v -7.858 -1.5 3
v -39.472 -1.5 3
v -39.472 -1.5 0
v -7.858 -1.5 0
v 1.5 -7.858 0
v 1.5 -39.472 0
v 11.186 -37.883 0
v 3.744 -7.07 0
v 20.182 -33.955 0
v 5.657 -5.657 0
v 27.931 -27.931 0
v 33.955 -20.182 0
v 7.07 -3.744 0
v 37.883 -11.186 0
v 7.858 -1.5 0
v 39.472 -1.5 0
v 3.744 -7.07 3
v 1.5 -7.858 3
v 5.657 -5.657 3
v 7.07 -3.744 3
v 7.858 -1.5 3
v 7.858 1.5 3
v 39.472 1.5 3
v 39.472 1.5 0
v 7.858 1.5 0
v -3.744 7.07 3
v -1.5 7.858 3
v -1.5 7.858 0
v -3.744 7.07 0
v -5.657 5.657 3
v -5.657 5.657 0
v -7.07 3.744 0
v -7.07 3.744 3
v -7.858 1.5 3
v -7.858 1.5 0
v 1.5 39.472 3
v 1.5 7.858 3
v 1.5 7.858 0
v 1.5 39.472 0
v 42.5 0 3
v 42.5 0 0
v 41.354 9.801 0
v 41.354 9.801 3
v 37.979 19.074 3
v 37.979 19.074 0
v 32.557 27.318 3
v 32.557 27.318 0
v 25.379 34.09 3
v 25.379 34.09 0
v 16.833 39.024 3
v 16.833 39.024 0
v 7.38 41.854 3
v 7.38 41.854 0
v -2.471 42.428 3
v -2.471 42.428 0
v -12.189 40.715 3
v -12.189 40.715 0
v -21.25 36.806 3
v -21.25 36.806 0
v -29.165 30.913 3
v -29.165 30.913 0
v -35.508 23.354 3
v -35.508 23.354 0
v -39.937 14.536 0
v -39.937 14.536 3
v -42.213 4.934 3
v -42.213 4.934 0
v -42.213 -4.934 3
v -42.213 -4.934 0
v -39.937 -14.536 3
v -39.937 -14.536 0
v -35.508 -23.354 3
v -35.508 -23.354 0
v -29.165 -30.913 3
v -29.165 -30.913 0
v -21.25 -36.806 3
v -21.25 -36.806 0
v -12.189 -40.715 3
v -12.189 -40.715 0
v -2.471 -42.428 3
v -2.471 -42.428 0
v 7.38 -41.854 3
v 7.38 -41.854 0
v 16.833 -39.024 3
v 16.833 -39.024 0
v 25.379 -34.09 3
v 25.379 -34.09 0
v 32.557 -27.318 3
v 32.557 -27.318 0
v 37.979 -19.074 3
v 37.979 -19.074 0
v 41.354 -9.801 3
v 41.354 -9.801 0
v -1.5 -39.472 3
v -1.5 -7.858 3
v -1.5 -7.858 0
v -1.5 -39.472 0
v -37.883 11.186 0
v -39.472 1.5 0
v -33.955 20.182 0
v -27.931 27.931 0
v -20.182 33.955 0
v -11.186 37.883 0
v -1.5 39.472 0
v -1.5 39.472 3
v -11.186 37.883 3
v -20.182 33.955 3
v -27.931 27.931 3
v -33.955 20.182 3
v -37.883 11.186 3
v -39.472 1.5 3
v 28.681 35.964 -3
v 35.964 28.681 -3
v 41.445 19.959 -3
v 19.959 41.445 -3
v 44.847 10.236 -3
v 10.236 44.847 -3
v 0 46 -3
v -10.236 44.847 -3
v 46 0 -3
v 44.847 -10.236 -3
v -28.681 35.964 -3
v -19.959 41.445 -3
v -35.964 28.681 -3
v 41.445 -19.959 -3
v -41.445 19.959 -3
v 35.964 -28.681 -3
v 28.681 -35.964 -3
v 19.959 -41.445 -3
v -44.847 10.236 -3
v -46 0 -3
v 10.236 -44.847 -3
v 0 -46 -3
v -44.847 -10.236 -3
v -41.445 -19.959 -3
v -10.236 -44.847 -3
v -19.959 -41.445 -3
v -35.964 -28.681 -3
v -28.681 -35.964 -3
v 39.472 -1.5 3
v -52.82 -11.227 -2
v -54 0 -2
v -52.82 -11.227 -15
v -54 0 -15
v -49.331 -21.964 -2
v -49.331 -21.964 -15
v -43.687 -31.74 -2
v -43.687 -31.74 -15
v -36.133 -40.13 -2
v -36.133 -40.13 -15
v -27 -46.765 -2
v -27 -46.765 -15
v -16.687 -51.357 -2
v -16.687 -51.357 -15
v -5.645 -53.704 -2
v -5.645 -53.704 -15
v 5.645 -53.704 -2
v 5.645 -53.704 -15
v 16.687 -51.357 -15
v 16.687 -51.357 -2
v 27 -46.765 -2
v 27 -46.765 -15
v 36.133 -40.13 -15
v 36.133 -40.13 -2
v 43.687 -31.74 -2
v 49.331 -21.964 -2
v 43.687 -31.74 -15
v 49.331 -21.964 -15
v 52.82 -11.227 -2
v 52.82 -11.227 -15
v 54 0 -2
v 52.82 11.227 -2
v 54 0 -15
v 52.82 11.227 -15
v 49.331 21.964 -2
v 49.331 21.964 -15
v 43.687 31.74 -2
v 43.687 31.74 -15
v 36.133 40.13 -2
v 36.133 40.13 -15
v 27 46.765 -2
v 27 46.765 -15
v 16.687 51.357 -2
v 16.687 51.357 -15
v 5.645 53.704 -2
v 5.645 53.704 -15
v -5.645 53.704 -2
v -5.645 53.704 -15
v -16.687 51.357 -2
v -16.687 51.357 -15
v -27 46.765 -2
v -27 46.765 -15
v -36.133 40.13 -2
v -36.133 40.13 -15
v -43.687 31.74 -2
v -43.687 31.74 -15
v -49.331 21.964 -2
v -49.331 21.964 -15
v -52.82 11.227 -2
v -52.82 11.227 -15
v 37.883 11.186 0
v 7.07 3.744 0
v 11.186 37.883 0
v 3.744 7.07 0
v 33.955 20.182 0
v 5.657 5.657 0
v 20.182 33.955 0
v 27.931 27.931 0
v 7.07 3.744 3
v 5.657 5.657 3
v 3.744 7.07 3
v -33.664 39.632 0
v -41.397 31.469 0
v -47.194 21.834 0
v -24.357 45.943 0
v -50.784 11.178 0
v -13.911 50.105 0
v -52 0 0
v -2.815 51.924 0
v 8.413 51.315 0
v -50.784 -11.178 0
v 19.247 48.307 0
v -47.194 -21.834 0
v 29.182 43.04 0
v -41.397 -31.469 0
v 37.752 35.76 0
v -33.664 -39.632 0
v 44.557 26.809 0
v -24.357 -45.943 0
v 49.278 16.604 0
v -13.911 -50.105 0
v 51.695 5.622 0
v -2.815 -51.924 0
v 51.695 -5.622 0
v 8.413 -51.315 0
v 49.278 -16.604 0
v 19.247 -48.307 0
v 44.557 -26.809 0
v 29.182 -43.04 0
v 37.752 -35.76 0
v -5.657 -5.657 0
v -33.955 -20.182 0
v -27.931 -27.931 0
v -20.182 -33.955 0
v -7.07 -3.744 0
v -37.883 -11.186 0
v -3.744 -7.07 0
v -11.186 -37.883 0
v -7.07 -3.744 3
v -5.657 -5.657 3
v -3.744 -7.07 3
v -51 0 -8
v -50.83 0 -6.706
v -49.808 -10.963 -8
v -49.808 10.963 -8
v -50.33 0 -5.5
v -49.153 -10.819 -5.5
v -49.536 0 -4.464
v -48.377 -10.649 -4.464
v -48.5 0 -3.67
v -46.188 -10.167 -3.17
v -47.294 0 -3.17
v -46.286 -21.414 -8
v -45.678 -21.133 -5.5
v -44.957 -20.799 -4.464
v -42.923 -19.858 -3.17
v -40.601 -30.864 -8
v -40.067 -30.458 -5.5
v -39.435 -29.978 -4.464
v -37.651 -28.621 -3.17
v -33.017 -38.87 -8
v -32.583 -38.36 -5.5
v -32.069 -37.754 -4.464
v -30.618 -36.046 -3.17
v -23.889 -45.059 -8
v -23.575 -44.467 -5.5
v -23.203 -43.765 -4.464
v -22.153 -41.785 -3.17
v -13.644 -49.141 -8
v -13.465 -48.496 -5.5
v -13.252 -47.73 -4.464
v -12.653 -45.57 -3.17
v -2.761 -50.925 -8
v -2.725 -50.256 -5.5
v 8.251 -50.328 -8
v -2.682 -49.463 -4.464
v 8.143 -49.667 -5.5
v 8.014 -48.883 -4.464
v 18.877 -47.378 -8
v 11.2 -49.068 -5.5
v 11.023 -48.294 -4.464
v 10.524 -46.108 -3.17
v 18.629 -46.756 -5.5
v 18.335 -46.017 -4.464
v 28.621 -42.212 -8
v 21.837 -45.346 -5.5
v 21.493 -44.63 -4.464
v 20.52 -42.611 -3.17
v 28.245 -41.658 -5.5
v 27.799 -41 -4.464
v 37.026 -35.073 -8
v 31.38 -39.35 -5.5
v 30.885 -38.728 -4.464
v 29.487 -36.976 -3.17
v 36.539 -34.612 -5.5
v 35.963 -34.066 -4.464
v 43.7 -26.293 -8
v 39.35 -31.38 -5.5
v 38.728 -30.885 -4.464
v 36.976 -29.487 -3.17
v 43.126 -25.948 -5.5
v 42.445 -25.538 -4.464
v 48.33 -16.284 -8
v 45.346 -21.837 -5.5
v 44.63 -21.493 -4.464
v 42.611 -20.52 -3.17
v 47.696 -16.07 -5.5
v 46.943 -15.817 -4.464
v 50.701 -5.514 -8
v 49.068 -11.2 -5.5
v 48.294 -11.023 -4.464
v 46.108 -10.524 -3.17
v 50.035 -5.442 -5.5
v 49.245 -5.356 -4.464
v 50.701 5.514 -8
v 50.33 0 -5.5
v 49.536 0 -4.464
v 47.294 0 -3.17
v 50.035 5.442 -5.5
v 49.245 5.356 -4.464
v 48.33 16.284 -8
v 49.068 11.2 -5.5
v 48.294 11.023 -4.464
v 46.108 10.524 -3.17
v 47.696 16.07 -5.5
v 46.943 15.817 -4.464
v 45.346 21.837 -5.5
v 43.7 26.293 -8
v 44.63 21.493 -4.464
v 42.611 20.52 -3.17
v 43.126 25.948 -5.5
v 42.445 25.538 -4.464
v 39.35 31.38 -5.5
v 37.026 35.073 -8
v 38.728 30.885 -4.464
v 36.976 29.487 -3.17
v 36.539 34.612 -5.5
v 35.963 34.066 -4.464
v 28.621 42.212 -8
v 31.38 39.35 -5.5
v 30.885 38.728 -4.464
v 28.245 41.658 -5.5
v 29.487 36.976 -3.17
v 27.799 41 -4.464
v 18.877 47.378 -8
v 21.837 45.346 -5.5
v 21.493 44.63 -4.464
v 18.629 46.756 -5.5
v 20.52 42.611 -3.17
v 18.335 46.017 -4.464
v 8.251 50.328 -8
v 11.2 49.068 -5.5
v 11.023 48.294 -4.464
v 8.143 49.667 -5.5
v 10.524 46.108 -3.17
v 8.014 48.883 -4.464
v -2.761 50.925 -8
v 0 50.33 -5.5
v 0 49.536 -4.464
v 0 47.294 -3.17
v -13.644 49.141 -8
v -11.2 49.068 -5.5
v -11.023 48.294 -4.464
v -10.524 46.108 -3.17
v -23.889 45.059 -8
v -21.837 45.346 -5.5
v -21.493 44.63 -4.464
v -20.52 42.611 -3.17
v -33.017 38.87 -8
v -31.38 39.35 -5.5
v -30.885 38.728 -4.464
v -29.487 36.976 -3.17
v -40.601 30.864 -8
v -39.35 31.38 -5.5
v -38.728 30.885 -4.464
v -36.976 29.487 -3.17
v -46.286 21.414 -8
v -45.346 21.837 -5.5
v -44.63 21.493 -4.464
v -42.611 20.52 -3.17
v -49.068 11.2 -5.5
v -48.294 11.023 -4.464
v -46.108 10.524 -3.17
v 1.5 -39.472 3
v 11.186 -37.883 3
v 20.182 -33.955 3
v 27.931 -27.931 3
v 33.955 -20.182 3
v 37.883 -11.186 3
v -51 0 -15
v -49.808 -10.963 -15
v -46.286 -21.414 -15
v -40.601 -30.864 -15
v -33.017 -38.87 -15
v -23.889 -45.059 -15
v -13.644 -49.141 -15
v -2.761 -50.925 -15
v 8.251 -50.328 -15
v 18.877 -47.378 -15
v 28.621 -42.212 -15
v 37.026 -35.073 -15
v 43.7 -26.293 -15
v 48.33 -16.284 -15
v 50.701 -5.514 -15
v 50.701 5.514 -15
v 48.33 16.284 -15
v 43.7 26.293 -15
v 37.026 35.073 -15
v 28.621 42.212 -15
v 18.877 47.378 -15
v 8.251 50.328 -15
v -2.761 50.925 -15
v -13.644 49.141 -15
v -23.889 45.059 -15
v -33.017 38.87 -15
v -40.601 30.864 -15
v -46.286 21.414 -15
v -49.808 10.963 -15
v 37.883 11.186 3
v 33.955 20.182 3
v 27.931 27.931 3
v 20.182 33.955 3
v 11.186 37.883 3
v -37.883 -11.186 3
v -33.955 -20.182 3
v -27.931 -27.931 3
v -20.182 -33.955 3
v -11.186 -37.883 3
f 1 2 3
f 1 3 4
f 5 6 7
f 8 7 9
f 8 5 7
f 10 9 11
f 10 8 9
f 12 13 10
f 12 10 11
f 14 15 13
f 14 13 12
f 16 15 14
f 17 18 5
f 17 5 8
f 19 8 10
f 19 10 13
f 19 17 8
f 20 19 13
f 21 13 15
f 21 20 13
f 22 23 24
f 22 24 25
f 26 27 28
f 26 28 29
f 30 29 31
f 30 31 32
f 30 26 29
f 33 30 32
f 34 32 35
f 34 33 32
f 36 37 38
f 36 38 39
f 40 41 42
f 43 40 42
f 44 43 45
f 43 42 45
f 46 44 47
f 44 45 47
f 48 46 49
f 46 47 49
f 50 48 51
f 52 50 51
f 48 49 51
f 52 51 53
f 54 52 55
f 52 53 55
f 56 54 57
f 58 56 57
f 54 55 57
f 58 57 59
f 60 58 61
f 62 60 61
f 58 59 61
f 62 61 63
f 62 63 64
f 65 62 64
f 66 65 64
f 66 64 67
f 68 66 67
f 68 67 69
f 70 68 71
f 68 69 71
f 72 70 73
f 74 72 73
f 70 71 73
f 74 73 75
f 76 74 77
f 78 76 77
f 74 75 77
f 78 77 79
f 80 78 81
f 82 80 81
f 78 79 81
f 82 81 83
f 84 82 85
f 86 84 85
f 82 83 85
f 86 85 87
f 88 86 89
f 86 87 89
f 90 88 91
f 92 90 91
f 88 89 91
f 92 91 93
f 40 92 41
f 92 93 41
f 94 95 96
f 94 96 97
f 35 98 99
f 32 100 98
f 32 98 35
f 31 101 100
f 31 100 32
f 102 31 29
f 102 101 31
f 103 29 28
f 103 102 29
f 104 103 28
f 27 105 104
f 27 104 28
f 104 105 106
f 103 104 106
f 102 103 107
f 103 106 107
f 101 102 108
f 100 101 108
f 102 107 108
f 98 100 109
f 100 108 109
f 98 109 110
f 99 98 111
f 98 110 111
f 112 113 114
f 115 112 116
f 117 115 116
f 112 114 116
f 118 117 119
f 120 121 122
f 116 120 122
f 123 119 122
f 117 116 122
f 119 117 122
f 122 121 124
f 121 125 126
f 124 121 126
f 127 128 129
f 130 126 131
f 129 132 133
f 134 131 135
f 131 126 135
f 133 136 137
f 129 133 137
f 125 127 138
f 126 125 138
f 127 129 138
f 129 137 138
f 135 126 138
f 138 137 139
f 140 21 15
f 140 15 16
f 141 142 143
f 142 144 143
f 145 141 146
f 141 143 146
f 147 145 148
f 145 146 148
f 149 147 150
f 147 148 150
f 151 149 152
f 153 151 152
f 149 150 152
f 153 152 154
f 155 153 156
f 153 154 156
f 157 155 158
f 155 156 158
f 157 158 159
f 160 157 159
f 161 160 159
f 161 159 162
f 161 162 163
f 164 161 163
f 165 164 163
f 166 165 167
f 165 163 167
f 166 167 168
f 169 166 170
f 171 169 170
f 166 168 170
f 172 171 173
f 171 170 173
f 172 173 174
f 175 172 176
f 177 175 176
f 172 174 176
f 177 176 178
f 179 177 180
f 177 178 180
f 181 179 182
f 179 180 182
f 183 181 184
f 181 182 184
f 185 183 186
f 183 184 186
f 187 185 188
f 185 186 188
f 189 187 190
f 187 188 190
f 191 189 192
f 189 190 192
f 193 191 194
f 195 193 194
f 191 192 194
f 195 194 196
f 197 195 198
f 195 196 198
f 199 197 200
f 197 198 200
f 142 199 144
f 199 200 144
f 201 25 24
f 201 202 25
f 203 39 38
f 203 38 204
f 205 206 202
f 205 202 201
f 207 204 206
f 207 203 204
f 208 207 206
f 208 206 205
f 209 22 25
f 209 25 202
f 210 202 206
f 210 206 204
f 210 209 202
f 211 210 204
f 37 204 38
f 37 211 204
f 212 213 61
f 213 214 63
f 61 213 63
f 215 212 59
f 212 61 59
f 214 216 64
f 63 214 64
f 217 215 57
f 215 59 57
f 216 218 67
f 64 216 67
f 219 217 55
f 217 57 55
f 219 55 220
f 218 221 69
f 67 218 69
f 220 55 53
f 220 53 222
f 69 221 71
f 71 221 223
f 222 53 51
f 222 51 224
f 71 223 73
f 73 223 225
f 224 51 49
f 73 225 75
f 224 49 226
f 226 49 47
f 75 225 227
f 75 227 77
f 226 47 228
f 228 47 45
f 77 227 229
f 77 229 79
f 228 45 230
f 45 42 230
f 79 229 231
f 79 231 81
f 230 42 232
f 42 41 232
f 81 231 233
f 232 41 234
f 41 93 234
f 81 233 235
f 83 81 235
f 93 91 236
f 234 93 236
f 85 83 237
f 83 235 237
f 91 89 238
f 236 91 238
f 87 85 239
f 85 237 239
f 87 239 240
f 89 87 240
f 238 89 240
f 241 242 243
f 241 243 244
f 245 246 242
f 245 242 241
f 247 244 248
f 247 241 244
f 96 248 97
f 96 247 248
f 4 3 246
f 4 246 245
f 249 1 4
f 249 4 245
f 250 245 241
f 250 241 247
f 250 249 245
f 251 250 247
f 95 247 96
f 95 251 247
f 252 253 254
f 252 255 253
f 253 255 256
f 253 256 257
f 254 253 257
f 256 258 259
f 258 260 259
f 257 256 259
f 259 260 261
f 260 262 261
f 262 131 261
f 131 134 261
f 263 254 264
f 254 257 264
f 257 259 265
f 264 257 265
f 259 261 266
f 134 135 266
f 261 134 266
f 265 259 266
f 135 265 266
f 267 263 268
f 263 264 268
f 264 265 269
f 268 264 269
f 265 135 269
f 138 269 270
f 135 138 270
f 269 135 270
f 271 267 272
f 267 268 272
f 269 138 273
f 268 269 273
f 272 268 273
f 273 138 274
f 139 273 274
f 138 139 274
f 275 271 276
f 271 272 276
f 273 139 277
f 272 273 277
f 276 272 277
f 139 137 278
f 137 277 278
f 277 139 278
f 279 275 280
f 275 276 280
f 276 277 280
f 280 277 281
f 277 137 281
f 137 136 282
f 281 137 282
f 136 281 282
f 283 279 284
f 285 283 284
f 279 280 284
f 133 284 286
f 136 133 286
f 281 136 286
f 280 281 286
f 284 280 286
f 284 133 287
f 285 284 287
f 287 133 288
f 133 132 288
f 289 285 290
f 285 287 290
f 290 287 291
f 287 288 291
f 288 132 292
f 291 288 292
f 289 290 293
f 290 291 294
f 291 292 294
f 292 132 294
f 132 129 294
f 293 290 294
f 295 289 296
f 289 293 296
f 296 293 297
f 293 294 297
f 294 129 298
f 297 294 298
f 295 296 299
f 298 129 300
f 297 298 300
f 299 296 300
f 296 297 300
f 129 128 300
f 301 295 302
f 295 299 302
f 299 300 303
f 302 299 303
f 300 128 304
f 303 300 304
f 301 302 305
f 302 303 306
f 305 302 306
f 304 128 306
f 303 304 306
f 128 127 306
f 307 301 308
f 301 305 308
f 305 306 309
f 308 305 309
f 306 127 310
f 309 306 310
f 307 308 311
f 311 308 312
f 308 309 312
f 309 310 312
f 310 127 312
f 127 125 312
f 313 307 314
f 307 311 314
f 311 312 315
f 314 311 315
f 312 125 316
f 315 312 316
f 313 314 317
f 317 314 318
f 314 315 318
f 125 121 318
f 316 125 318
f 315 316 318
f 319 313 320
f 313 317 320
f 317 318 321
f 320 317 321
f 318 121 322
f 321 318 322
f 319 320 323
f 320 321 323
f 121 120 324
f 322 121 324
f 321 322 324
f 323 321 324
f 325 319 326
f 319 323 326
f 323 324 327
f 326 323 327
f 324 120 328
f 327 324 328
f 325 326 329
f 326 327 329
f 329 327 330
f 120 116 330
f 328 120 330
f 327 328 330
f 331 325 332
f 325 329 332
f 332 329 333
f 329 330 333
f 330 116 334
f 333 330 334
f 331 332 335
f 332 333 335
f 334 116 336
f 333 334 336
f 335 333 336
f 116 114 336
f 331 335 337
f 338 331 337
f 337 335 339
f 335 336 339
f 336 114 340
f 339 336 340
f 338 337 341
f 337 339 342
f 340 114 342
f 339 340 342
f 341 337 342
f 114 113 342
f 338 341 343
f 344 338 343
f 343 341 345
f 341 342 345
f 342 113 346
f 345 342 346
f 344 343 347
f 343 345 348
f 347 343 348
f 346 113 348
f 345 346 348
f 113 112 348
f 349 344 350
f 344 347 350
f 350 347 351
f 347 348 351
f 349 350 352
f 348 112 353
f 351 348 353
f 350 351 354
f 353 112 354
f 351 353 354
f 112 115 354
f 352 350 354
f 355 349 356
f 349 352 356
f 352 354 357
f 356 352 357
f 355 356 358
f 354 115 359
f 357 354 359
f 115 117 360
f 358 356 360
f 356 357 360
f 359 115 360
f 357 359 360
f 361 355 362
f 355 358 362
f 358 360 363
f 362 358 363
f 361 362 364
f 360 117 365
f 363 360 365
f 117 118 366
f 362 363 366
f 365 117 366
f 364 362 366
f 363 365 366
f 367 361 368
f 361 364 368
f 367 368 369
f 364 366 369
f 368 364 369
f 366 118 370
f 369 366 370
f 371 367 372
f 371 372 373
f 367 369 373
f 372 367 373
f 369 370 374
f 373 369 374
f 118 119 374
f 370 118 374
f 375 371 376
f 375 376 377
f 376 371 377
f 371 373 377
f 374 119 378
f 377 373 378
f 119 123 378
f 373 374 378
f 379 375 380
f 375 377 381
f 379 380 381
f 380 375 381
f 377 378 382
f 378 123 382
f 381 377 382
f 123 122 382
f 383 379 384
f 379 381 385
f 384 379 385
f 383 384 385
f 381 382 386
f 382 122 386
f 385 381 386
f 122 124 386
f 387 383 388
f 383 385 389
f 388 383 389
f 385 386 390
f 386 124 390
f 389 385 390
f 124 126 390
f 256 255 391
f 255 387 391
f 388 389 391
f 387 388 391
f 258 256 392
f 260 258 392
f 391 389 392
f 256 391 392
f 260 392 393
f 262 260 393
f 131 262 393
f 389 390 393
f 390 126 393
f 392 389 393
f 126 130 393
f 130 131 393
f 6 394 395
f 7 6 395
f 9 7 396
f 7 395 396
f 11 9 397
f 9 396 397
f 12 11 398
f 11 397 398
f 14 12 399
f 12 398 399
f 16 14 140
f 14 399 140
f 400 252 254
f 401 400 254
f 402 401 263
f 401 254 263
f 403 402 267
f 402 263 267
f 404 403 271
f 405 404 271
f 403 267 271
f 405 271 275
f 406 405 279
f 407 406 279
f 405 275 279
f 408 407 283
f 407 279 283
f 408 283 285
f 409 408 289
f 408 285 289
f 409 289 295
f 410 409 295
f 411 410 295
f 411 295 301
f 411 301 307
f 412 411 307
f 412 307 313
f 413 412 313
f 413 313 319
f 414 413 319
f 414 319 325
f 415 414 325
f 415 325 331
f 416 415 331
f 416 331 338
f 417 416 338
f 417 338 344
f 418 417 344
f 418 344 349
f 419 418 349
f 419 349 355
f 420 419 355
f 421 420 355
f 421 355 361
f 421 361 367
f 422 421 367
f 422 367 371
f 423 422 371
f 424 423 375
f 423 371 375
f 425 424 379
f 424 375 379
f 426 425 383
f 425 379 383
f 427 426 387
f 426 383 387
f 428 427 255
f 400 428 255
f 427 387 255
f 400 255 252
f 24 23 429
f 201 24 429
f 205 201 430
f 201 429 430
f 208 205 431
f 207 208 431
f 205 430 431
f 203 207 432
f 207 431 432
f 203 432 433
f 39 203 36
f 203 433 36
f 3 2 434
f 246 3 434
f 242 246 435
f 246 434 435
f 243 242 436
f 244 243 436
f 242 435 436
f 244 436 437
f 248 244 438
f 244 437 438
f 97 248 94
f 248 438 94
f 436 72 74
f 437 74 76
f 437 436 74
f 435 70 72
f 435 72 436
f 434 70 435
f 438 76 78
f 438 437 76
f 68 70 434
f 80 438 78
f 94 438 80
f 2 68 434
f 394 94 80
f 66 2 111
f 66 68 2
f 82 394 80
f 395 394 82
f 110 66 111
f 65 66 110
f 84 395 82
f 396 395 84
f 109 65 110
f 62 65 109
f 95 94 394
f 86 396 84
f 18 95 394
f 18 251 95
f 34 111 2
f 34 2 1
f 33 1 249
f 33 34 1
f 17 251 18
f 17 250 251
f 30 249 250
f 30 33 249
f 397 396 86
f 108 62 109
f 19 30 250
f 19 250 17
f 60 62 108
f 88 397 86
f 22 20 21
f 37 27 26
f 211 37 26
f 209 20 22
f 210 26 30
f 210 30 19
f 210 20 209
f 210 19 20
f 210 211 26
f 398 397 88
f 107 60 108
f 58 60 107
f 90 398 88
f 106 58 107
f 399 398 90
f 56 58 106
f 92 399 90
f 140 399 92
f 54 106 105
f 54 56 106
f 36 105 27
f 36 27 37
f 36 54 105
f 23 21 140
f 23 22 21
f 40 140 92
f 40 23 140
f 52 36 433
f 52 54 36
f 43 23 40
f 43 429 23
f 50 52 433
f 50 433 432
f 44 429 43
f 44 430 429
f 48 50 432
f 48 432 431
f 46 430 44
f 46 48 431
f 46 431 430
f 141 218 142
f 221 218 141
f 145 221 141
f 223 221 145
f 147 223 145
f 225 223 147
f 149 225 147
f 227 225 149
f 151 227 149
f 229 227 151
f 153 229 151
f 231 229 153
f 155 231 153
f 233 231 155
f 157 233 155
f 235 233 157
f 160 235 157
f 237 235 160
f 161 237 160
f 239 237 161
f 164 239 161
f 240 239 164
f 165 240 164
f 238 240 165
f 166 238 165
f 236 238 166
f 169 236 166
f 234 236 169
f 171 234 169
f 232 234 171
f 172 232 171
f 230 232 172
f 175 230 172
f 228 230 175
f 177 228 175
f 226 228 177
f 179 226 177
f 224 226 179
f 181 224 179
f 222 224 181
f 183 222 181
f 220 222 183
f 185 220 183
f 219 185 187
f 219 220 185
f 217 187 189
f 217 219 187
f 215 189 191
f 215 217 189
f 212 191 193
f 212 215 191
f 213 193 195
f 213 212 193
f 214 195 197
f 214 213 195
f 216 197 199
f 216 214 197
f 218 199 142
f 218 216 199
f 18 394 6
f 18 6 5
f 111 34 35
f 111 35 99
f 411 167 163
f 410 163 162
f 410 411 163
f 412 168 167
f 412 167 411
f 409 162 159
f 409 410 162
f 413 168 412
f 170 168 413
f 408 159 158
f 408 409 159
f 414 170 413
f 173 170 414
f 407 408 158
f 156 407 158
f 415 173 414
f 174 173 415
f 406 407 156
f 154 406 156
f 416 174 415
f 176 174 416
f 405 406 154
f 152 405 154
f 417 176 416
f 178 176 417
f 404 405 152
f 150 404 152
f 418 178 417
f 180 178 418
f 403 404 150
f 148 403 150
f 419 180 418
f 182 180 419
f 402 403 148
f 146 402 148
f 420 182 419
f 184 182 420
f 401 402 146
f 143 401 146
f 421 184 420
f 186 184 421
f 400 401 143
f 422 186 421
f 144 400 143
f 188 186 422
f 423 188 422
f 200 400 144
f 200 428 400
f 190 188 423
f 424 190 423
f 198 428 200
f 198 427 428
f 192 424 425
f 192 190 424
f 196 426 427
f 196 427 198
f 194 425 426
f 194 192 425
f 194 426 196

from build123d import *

# Parameters (mm, degrees)
EXTRUDE_1_DEPTH                  = 10
FILLET_1_R                       = 2
PATTERN_CIRCULAR_2_COUNT         = 3
FILLET_1_OF_PATTERN_CIRCULAR_2_R = 2
CUT_EXTRUDE_START                = -15
SKETCH_3_R                       = 51
CUT_EXTRUDE_1_DEPTH              = 15
SKETCH_4_R                       = 62.618720145
SKETCH_4_R_2                     = 57
CUT_EXTRUDE_2_DEPTH              = 15
CHAMFER_1_SIZE                   = 2
FILLET_2_R                       = 5
SKETCH_5_R                       = 42.5
EXTRUDE_2_DEPTH                  = 3
SKETCH_7_R                       = 39.5
CUT_EXTRUDE_3_DEPTH              = 3
EXTRUDE_START                    = 3
SKETCH_8_W                       = 3
SKETCH_8_H                       = 3
EXTRUDE_4_DEPTH                  = 3
SKETCH_9_R                       = 73.179522897
CUT_EXTRUDE_4_DEPTH              = 130


with BuildPart() as part:
    # Эскиз1 → Повернуть1 (revolve)
    with BuildSketch(Plane(origin=(0, 0, 0), x_dir=(1, 0, 0), z_dir=(0, 1, 0))):
        Polygon((0, 0), (-54, 0), (-54, 145), (-51, 145), (-51, 3), (0, 3), align=None)
    revolve(axis=Axis((0, 0, -3), (0, 0, 1)))

    # Эскиз2 → Бобышка-Вытянуть1 (add)
    with BuildSketch(Plane(origin=(57, 0, 0), x_dir=(0, 0, -1), z_dir=(1, 0, 0))):
        Polygon((145, 14), (145, -14), (140, -14), (138.5, 11), (134, 11), (134, 14), align=None)
    extrude_1 = extrude(amount=-EXTRUDE_1_DEPTH)

    # Скругление1
    fillet_1_edges = [part.edges().sort_by_distance(p)[0] for p in [
        (54.576809621, -14, -140),
    ]]
    fillet(fillet_1_edges, radius=FILLET_1_R)

    # Круговой массив2: Бобышка-Вытянуть1 ×3 about axis
    pattern_circular_2_axis = Axis((0, 0, 0), (0, 0, 1))
    for i in range(1, PATTERN_CIRCULAR_2_COUNT):
        add(extrude_1.rotate(pattern_circular_2_axis, i * 360 / PATTERN_CIRCULAR_2_COUNT))

    # Скругление1 of Круговой массив2
    fillet_1_of_pattern_circular_2_edges = [part.edges().sort_by_distance(p)[0] for p in [
        (-15.164049157, 54.264903589, -140),
        (-39.412760463, -40.264903589, -140),
    ]]
    fillet(fillet_1_of_pattern_circular_2_edges, radius=FILLET_1_OF_PATTERN_CIRCULAR_2_R)

    # Эскиз3 → Вырез-Вытянуть1 (cut)
    with BuildSketch(Plane(origin=(0, 0, -145), x_dir=(-1, 0, 0), z_dir=(0, 0, -1)).offset(CUT_EXTRUDE_START)):
        Circle(SKETCH_3_R)
    extrude(amount=CUT_EXTRUDE_1_DEPTH, mode=Mode.SUBTRACT)

    # Эскиз4 → Вырез-Вытянуть2 (cut)
    with BuildSketch(Plane(origin=(0, 0, -145), x_dir=(-1, 0, 0), z_dir=(0, 0, -1))):
        Circle(SKETCH_4_R)
        Circle(SKETCH_4_R_2, mode=Mode.SUBTRACT)
    extrude(amount=-CUT_EXTRUDE_2_DEPTH, mode=Mode.SUBTRACT)

    # Фаска1
    chamfer_1_edges = [part.edges().sort_by_distance(p)[0] for p in [
        (54, 0, 0),
    ]]
    chamfer(chamfer_1_edges, length=CHAMFER_1_SIZE)

    # Скругление2
    fillet_2_edges = [part.edges().sort_by_distance(p)[0] for p in [
        (51, 0, -3),
    ]]
    fillet(fillet_2_edges, radius=FILLET_2_R)

    # Эскиз5 → Бобышка-Вытянуть2 (add)
    with BuildSketch(Plane.XY):
        Circle(SKETCH_5_R)
    extrude(amount=EXTRUDE_2_DEPTH)

    # Эскиз7 → Вырез-Вытянуть3 (cut)
    with BuildSketch(Plane.XY.offset(3)):
        Circle(SKETCH_7_R)
    extrude(amount=-CUT_EXTRUDE_3_DEPTH, mode=Mode.SUBTRACT)

    # Эскиз8 → Бобышка-Вытянуть4 (add)
    with BuildSketch(Plane.XY.offset(EXTRUDE_START)):
        with BuildLine():
            Line((-1.5, -7.858116823), (-1.5, -39.471508712))
            ThreePointArc((-1.5, -39.471508712), (0, -39.5), (1.5, -39.471508712))
            Line((1.5, -39.471508712), (1.5, -7.858116823))
            ThreePointArc((1.5, -7.858116823), (0, -8), (-1.5, -7.858116823))
        make_face()
        with BuildLine():
            ThreePointArc((1.5, 39.471508712), (0, 39.5), (-1.5, 39.471508712))
            Line((-1.5, 39.471508712), (-1.5, 7.858116823))
            ThreePointArc((-1.5, 7.858116823), (0, 8), (1.5, 7.858116823))
            Line((1.5, 7.858116823), (1.5, 39.471508712))
        make_face()
        with BuildLine():
            Line((-1.5, 7.858116823), (-1.5, 1.5))
            Line((-1.5, 1.5), (1.5, 1.5))
            Line((1.5, 1.5), (1.5, 7.858116823))
            ThreePointArc((1.5, 7.858116823), (0, 8), (-1.5, 7.858116823))
        make_face()
        with BuildLine():
            Line((1.5, 7.858116823), (1.5, 1.5))
            Line((1.5, 1.5), (7.858116823, 1.5))
            ThreePointArc((7.858116823, 1.5), (5.656854249, 5.656854249), (1.5, 7.858116823))
        make_face()
        with BuildLine():
            Line((1.5, 1.5), (1.5, -1.5))
            Line((1.5, -1.5), (7.858116823, -1.5))
            ThreePointArc((7.858116823, -1.5), (7.964450219, -0.753347668), (8, 0))
            ThreePointArc((8, 0), (7.964450219, 0.753347668), (7.858116823, 1.5))
            Line((7.858116823, 1.5), (1.5, 1.5))
        make_face()
        with BuildLine():
            ThreePointArc((-39.471508712, 1.5), (-39.5, 0), (-39.471508712, -1.5))
            Line((-39.471508712, -1.5), (-7.858116823, -1.5))
            ThreePointArc((-7.858116823, -1.5), (-8, 0), (-7.858116823, 1.5))
            Line((-7.858116823, 1.5), (-39.471508712, 1.5))
        make_face()
        with BuildLine():
            Line((7.858116823, -1.5), (39.471508712, -1.5))
            ThreePointArc((39.471508712, -1.5), (39.492876536, -0.75013528), (39.5, 0))
            ThreePointArc((39.5, 0), (39.492876536, 0.75013528), (39.471508712, 1.5))
            Line((39.471508712, 1.5), (7.858116823, 1.5))
            ThreePointArc((7.858116823, 1.5), (7.964450219, 0.753347668), (8, 0))
            ThreePointArc((8, 0), (7.964450219, -0.753347668), (7.858116823, -1.5))
        make_face()
        with BuildLine():
            Line((1.5, -1.5), (1.5, -7.858116823))
            ThreePointArc((1.5, -7.858116823), (5.656854249, -5.656854249), (7.858116823, -1.5))
            Line((7.858116823, -1.5), (1.5, -1.5))
        make_face()
        with BuildLine():
            Line((-1.5, -1.5), (-1.5, -7.858116823))
            ThreePointArc((-1.5, -7.858116823), (0, -8), (1.5, -7.858116823))
            Line((1.5, -7.858116823), (1.5, -1.5))
            Line((1.5, -1.5), (-1.5, -1.5))
        make_face()
        Rectangle(SKETCH_8_W, SKETCH_8_H)
        with BuildLine():
            Line((-7.858116823, 1.5), (-1.5, 1.5))
            Line((-1.5, 1.5), (-1.5, 7.858116823))
            ThreePointArc((-1.5, 7.858116823), (-5.656854249, 5.656854249), (-7.858116823, 1.5))
        make_face()
        with BuildLine():
            Line((-7.858116823, -1.5), (-1.5, -1.5))
            Line((-1.5, -1.5), (-1.5, 1.5))
            Line((-1.5, 1.5), (-7.858116823, 1.5))
            ThreePointArc((-7.858116823, 1.5), (-8, 0), (-7.858116823, -1.5))
        make_face()
        with BuildLine():
            ThreePointArc((-7.858116823, -1.5), (-5.656854249, -5.656854249), (-1.5, -7.858116823))
            Line((-1.5, -7.858116823), (-1.5, -1.5))
            Line((-1.5, -1.5), (-7.858116823, -1.5))
        make_face()
    extrude(amount=-EXTRUDE_4_DEPTH)

    # Эскиз9 → Вырез-Вытянуть4 (cut)
    with BuildSketch(Plane(origin=(0, 0, -145), x_dir=(-1, 0, 0), z_dir=(0, 0, -1))):
        Circle(SKETCH_9_R)
    extrude(amount=-CUT_EXTRUDE_4_DEPTH, mode=Mode.SUBTRACT)


solid = part.part
